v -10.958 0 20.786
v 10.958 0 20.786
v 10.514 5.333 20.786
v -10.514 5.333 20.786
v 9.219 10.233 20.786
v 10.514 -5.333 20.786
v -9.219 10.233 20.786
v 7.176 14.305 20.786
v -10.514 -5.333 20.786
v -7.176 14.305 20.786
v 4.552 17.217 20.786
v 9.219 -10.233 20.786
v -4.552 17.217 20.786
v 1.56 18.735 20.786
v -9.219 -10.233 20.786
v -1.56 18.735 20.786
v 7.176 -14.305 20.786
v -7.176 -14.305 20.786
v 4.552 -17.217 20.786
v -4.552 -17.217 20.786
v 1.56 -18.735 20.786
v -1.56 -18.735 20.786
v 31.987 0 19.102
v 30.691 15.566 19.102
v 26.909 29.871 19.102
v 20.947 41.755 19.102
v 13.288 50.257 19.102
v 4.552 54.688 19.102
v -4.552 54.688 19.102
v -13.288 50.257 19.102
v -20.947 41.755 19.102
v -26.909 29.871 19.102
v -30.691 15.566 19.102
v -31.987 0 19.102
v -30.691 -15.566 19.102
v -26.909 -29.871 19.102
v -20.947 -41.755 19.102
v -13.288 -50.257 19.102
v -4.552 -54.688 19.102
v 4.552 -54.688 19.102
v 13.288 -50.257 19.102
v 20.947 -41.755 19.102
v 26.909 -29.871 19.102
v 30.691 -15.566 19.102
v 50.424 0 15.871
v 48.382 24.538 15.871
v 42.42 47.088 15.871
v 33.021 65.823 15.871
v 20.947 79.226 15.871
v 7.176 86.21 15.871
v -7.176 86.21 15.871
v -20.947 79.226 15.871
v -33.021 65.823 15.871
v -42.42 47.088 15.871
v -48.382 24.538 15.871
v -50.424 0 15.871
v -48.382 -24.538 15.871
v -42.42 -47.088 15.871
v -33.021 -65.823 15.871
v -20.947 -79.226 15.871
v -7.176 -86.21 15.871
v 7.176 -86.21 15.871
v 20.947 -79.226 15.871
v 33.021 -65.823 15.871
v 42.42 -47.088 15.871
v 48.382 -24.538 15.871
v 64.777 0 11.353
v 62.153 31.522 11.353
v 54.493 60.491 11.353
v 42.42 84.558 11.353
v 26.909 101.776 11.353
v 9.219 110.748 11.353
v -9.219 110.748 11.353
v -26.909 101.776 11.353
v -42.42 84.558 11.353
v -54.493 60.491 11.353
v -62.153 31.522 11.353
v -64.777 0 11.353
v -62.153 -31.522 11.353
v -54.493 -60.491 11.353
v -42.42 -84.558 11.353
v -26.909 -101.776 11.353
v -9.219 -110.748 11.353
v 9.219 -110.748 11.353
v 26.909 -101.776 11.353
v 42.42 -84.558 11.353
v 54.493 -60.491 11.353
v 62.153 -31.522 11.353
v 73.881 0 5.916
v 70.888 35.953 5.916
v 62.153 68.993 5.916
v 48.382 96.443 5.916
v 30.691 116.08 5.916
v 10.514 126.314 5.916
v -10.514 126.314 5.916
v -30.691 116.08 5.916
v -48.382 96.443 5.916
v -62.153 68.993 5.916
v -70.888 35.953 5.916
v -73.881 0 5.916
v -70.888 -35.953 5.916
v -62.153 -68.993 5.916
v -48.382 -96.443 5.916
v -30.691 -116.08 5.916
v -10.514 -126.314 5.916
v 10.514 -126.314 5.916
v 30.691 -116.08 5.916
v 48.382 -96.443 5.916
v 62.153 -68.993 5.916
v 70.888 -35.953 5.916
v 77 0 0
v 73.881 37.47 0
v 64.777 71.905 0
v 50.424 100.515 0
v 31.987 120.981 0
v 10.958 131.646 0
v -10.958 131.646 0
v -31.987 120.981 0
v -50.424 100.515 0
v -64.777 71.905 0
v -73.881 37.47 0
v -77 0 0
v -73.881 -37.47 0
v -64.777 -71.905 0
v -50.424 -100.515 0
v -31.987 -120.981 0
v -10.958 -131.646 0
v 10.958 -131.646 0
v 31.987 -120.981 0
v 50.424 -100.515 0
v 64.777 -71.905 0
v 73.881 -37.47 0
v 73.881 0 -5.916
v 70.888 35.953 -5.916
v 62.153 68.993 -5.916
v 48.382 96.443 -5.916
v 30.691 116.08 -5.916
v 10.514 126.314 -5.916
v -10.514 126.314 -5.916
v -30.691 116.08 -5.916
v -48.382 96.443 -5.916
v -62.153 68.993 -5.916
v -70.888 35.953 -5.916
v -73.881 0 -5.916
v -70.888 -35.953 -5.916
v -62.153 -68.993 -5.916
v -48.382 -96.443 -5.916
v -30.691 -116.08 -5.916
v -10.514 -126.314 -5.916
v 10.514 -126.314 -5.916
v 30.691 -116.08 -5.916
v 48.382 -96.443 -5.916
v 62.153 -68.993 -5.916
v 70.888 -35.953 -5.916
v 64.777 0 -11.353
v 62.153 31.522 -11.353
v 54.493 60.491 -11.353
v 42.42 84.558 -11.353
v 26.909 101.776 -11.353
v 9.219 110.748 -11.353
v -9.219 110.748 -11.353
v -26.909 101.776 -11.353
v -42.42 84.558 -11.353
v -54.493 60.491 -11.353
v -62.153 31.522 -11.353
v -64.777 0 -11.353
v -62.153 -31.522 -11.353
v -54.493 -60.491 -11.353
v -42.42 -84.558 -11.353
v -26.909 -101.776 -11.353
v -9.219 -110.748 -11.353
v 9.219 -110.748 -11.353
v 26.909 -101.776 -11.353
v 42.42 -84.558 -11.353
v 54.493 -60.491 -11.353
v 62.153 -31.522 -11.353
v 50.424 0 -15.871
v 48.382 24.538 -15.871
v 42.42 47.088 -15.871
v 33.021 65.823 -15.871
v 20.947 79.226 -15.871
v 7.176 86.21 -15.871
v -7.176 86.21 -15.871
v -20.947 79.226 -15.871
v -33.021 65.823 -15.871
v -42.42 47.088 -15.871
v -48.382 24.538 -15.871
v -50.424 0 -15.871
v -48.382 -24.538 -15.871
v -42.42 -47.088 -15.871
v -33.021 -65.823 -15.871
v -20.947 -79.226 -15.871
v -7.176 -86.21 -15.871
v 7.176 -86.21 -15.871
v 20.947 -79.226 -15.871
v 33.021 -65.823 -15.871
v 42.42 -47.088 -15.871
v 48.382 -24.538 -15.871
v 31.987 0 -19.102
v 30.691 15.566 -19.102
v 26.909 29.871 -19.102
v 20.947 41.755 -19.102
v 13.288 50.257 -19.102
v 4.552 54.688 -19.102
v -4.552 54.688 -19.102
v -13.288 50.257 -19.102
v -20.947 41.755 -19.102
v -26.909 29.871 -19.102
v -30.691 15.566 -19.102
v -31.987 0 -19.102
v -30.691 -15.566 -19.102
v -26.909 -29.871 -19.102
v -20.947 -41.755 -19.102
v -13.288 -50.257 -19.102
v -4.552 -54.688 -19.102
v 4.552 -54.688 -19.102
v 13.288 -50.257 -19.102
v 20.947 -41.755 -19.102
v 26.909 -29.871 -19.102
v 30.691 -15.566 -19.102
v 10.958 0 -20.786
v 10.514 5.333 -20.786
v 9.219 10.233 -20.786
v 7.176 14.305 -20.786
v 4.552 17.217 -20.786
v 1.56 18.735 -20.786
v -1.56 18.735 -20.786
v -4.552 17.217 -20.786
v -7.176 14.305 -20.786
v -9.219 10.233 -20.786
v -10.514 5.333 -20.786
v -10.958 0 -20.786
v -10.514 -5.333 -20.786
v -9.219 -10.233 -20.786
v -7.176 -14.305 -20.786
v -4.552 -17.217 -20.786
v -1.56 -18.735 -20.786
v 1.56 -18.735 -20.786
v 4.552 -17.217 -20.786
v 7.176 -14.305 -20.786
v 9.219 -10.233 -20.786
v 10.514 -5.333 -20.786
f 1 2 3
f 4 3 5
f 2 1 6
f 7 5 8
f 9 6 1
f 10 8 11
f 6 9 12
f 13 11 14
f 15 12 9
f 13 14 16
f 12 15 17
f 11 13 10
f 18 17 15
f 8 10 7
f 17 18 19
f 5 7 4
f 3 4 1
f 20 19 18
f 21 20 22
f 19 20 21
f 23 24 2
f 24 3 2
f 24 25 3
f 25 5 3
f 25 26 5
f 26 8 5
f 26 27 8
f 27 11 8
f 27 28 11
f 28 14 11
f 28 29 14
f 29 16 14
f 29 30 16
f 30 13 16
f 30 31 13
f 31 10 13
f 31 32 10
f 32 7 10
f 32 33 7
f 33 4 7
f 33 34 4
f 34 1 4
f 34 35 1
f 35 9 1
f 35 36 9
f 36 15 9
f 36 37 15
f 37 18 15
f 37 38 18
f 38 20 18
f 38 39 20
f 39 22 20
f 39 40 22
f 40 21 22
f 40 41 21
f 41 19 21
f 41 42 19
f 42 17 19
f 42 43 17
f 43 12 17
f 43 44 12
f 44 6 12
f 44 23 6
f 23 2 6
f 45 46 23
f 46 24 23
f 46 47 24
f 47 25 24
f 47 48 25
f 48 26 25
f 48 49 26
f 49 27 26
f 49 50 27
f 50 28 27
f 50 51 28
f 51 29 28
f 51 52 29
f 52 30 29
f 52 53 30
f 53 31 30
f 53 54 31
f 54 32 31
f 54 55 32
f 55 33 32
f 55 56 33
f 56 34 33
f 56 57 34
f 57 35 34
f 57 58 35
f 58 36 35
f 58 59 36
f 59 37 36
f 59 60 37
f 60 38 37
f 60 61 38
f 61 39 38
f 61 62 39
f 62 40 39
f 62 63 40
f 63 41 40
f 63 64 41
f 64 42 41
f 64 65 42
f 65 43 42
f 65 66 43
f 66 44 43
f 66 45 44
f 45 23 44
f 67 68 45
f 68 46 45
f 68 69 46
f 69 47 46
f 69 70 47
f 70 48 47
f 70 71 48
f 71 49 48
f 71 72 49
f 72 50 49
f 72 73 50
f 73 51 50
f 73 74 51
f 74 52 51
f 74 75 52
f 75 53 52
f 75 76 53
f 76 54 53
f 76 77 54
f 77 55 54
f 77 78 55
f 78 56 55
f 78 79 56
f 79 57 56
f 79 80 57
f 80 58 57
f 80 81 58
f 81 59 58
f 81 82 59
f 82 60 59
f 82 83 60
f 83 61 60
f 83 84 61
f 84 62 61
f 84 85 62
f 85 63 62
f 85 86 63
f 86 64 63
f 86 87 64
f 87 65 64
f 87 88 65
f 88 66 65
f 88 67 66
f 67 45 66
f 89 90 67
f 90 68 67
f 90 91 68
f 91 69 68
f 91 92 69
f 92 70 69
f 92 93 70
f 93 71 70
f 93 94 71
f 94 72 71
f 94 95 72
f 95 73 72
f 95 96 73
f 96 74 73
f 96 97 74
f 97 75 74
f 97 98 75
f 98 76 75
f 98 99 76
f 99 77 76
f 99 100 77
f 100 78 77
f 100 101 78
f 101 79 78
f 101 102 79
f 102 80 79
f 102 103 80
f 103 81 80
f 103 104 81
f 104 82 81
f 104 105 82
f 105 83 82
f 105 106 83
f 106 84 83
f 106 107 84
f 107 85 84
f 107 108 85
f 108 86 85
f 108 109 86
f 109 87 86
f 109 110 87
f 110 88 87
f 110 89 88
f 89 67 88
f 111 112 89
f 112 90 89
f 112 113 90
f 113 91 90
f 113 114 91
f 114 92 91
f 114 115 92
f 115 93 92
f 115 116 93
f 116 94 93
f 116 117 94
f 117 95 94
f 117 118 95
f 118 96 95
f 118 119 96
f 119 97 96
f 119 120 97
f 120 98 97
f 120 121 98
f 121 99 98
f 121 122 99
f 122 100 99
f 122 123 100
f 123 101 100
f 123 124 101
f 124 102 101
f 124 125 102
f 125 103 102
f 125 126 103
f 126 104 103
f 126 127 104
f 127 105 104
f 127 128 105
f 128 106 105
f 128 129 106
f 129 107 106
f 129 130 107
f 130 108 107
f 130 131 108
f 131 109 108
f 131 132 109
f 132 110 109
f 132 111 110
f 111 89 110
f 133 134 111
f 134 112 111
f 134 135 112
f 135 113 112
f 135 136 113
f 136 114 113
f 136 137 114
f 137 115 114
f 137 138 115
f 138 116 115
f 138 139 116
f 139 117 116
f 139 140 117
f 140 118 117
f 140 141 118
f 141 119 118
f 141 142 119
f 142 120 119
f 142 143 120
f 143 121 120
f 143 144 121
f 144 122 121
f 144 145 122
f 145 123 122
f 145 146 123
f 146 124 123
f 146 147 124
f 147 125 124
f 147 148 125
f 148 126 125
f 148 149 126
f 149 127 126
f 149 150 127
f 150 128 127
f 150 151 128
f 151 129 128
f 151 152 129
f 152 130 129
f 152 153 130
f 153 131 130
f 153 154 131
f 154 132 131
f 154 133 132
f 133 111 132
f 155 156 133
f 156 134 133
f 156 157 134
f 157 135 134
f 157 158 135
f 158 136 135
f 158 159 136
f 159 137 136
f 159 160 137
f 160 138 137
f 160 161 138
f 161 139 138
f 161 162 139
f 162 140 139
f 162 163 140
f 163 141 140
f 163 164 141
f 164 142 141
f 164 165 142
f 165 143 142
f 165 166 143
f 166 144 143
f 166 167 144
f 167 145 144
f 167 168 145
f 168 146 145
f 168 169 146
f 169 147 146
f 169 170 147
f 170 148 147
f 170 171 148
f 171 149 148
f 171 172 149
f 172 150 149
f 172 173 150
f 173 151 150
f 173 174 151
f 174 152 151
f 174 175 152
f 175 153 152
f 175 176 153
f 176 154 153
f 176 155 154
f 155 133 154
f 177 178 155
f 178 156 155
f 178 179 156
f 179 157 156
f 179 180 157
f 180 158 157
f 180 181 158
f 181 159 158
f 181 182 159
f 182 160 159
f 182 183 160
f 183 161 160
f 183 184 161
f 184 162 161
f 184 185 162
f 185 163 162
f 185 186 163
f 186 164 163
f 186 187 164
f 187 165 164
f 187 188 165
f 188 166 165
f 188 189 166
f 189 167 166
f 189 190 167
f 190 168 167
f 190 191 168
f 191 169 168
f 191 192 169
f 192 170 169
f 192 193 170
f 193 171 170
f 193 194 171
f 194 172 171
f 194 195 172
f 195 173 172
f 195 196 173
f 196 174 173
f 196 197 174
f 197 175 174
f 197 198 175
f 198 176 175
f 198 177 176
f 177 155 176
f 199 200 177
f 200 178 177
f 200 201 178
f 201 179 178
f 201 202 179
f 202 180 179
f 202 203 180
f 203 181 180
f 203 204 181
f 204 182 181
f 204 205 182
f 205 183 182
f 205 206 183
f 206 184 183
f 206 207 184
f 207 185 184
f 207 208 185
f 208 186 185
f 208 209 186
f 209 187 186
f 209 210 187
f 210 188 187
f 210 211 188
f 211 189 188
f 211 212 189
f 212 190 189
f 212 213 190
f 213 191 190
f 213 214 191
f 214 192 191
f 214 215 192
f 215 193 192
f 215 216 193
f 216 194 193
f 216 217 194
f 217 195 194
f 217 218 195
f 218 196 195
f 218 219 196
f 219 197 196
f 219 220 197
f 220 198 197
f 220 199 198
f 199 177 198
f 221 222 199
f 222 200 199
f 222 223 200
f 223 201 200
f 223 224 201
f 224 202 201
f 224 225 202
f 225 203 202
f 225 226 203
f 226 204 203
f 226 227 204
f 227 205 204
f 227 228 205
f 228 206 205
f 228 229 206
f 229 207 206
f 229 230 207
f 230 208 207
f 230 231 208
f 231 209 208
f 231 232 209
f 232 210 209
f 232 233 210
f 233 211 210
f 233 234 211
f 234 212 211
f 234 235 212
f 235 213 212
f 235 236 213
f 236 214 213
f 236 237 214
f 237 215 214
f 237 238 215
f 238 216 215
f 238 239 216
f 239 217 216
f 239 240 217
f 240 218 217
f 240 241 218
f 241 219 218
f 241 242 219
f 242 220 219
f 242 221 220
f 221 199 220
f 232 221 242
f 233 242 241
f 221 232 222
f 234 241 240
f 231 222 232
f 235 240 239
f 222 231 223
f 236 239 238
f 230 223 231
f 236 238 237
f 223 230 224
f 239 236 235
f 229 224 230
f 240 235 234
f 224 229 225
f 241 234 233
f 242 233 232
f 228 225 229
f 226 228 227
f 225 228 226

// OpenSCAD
// Generated by SolidPython 1.0.1 on 2020-07-29 00:46:50


scale(v = [11, 19, 3]) {
	sphere(r = 7);
}
/***********************************************
*********      SolidPython code:      **********
************************************************
 
# import packages: SolidPython
from solid import *
from solid.utils import *
from itertools import chain, combinations, permutations


class Resize:

    def __init__(self, scad_file):
        self.scad_file = scad_file
        #self.scad_file = import_scad(scad_file)
        # cone/cylinder param:
        self.r1 = 0
        self.r2 = 0
        self.h = 0
        # rectangular prism param:
        self.w = 0
        self.l = 0
        # ellipse param:
        self.r = 0

    # import OpenScad code (file name corresponds to shape)


    # classify shape + parameters
    def assign(self, param1, param2, param3):
        if self.scad_file == 'cone.scad':
            self.r1 = param1
            self.r2 = param2
            self.h = param3
        elif self.scad_file == 'cylinder.scad':
            self.r1 = param1
            self.r2 = param2
            self.h = param3
        elif self.scad_file == 'rectangularPrism.scad':
            self.h = param1
            self.l = param2
            self.w = param3
        else:
            self.r = param1
            self.h = param2

    # resize parameters
    def iterate(self):
        x = range(3, 20, 2)
        i = 1
        if self.scad_file == 'cone.scad':
            tempList = list(permutations(x, 2))
            for temp in tempList:
                param1 = temp[0]
                param2 = temp[1]
                filepath = 'produced_scad_files/' + 'cone' + str(param1) + '_' + str(param2) + '_' + '.scad'
                scad_render_to_file(cylinder(h=param1, r1=param2, r2=0), filepath)

        elif self.scad_file == 'cylinder.scad':
            tempList = list(permutations(x, 3))
            for temp in tempList:
                param1 = temp[0]
                param2 = temp[1]
                filepath = 'produced_scad_files/' + 'cylinder' + str(param1) + '_' + str(param2) + '_' + '.scad'
                scad_render_to_file(cylinder(h=param1, r1=param2, r2=param2), filepath)

        elif self.scad_file == 'rectangularPrism.scad':
            tempList = list(permutations(x, 3))
            for temp in tempList:
                param1 = temp[0]
                param2 = temp[1]
                param3 = temp[2]
                filepath = 'produced_scad_files/' + 'rectangularPrism' + str(param1) + '_' + str(param2) + '_' + str(
                    param3) + '.scad'
                scad_render_to_file(cube(size=(param1, param2, param3)), filepath)

        elif self.scad_file == 'ellipse.scad':
            tempList = list(permutations(x, 4))
            for temp in tempList:
                param1 = temp[0]
                param2 = temp[1]
                param3 = temp[2]
                param4 = temp[3]
                filepath = 'produced_scad_files/' + 'ellipse' + str(param1) + '_' + str(param2) + '_' + str(param3) + '_' + str(param4) + '.scad'
                scad_render_to_file(scale([param1, param2, param3])(sphere(r=param4)), filepath)

    def render_to_scadfile(self):
        scad_render_to_file(scad, 'example.scad') 
 
************************************************/
